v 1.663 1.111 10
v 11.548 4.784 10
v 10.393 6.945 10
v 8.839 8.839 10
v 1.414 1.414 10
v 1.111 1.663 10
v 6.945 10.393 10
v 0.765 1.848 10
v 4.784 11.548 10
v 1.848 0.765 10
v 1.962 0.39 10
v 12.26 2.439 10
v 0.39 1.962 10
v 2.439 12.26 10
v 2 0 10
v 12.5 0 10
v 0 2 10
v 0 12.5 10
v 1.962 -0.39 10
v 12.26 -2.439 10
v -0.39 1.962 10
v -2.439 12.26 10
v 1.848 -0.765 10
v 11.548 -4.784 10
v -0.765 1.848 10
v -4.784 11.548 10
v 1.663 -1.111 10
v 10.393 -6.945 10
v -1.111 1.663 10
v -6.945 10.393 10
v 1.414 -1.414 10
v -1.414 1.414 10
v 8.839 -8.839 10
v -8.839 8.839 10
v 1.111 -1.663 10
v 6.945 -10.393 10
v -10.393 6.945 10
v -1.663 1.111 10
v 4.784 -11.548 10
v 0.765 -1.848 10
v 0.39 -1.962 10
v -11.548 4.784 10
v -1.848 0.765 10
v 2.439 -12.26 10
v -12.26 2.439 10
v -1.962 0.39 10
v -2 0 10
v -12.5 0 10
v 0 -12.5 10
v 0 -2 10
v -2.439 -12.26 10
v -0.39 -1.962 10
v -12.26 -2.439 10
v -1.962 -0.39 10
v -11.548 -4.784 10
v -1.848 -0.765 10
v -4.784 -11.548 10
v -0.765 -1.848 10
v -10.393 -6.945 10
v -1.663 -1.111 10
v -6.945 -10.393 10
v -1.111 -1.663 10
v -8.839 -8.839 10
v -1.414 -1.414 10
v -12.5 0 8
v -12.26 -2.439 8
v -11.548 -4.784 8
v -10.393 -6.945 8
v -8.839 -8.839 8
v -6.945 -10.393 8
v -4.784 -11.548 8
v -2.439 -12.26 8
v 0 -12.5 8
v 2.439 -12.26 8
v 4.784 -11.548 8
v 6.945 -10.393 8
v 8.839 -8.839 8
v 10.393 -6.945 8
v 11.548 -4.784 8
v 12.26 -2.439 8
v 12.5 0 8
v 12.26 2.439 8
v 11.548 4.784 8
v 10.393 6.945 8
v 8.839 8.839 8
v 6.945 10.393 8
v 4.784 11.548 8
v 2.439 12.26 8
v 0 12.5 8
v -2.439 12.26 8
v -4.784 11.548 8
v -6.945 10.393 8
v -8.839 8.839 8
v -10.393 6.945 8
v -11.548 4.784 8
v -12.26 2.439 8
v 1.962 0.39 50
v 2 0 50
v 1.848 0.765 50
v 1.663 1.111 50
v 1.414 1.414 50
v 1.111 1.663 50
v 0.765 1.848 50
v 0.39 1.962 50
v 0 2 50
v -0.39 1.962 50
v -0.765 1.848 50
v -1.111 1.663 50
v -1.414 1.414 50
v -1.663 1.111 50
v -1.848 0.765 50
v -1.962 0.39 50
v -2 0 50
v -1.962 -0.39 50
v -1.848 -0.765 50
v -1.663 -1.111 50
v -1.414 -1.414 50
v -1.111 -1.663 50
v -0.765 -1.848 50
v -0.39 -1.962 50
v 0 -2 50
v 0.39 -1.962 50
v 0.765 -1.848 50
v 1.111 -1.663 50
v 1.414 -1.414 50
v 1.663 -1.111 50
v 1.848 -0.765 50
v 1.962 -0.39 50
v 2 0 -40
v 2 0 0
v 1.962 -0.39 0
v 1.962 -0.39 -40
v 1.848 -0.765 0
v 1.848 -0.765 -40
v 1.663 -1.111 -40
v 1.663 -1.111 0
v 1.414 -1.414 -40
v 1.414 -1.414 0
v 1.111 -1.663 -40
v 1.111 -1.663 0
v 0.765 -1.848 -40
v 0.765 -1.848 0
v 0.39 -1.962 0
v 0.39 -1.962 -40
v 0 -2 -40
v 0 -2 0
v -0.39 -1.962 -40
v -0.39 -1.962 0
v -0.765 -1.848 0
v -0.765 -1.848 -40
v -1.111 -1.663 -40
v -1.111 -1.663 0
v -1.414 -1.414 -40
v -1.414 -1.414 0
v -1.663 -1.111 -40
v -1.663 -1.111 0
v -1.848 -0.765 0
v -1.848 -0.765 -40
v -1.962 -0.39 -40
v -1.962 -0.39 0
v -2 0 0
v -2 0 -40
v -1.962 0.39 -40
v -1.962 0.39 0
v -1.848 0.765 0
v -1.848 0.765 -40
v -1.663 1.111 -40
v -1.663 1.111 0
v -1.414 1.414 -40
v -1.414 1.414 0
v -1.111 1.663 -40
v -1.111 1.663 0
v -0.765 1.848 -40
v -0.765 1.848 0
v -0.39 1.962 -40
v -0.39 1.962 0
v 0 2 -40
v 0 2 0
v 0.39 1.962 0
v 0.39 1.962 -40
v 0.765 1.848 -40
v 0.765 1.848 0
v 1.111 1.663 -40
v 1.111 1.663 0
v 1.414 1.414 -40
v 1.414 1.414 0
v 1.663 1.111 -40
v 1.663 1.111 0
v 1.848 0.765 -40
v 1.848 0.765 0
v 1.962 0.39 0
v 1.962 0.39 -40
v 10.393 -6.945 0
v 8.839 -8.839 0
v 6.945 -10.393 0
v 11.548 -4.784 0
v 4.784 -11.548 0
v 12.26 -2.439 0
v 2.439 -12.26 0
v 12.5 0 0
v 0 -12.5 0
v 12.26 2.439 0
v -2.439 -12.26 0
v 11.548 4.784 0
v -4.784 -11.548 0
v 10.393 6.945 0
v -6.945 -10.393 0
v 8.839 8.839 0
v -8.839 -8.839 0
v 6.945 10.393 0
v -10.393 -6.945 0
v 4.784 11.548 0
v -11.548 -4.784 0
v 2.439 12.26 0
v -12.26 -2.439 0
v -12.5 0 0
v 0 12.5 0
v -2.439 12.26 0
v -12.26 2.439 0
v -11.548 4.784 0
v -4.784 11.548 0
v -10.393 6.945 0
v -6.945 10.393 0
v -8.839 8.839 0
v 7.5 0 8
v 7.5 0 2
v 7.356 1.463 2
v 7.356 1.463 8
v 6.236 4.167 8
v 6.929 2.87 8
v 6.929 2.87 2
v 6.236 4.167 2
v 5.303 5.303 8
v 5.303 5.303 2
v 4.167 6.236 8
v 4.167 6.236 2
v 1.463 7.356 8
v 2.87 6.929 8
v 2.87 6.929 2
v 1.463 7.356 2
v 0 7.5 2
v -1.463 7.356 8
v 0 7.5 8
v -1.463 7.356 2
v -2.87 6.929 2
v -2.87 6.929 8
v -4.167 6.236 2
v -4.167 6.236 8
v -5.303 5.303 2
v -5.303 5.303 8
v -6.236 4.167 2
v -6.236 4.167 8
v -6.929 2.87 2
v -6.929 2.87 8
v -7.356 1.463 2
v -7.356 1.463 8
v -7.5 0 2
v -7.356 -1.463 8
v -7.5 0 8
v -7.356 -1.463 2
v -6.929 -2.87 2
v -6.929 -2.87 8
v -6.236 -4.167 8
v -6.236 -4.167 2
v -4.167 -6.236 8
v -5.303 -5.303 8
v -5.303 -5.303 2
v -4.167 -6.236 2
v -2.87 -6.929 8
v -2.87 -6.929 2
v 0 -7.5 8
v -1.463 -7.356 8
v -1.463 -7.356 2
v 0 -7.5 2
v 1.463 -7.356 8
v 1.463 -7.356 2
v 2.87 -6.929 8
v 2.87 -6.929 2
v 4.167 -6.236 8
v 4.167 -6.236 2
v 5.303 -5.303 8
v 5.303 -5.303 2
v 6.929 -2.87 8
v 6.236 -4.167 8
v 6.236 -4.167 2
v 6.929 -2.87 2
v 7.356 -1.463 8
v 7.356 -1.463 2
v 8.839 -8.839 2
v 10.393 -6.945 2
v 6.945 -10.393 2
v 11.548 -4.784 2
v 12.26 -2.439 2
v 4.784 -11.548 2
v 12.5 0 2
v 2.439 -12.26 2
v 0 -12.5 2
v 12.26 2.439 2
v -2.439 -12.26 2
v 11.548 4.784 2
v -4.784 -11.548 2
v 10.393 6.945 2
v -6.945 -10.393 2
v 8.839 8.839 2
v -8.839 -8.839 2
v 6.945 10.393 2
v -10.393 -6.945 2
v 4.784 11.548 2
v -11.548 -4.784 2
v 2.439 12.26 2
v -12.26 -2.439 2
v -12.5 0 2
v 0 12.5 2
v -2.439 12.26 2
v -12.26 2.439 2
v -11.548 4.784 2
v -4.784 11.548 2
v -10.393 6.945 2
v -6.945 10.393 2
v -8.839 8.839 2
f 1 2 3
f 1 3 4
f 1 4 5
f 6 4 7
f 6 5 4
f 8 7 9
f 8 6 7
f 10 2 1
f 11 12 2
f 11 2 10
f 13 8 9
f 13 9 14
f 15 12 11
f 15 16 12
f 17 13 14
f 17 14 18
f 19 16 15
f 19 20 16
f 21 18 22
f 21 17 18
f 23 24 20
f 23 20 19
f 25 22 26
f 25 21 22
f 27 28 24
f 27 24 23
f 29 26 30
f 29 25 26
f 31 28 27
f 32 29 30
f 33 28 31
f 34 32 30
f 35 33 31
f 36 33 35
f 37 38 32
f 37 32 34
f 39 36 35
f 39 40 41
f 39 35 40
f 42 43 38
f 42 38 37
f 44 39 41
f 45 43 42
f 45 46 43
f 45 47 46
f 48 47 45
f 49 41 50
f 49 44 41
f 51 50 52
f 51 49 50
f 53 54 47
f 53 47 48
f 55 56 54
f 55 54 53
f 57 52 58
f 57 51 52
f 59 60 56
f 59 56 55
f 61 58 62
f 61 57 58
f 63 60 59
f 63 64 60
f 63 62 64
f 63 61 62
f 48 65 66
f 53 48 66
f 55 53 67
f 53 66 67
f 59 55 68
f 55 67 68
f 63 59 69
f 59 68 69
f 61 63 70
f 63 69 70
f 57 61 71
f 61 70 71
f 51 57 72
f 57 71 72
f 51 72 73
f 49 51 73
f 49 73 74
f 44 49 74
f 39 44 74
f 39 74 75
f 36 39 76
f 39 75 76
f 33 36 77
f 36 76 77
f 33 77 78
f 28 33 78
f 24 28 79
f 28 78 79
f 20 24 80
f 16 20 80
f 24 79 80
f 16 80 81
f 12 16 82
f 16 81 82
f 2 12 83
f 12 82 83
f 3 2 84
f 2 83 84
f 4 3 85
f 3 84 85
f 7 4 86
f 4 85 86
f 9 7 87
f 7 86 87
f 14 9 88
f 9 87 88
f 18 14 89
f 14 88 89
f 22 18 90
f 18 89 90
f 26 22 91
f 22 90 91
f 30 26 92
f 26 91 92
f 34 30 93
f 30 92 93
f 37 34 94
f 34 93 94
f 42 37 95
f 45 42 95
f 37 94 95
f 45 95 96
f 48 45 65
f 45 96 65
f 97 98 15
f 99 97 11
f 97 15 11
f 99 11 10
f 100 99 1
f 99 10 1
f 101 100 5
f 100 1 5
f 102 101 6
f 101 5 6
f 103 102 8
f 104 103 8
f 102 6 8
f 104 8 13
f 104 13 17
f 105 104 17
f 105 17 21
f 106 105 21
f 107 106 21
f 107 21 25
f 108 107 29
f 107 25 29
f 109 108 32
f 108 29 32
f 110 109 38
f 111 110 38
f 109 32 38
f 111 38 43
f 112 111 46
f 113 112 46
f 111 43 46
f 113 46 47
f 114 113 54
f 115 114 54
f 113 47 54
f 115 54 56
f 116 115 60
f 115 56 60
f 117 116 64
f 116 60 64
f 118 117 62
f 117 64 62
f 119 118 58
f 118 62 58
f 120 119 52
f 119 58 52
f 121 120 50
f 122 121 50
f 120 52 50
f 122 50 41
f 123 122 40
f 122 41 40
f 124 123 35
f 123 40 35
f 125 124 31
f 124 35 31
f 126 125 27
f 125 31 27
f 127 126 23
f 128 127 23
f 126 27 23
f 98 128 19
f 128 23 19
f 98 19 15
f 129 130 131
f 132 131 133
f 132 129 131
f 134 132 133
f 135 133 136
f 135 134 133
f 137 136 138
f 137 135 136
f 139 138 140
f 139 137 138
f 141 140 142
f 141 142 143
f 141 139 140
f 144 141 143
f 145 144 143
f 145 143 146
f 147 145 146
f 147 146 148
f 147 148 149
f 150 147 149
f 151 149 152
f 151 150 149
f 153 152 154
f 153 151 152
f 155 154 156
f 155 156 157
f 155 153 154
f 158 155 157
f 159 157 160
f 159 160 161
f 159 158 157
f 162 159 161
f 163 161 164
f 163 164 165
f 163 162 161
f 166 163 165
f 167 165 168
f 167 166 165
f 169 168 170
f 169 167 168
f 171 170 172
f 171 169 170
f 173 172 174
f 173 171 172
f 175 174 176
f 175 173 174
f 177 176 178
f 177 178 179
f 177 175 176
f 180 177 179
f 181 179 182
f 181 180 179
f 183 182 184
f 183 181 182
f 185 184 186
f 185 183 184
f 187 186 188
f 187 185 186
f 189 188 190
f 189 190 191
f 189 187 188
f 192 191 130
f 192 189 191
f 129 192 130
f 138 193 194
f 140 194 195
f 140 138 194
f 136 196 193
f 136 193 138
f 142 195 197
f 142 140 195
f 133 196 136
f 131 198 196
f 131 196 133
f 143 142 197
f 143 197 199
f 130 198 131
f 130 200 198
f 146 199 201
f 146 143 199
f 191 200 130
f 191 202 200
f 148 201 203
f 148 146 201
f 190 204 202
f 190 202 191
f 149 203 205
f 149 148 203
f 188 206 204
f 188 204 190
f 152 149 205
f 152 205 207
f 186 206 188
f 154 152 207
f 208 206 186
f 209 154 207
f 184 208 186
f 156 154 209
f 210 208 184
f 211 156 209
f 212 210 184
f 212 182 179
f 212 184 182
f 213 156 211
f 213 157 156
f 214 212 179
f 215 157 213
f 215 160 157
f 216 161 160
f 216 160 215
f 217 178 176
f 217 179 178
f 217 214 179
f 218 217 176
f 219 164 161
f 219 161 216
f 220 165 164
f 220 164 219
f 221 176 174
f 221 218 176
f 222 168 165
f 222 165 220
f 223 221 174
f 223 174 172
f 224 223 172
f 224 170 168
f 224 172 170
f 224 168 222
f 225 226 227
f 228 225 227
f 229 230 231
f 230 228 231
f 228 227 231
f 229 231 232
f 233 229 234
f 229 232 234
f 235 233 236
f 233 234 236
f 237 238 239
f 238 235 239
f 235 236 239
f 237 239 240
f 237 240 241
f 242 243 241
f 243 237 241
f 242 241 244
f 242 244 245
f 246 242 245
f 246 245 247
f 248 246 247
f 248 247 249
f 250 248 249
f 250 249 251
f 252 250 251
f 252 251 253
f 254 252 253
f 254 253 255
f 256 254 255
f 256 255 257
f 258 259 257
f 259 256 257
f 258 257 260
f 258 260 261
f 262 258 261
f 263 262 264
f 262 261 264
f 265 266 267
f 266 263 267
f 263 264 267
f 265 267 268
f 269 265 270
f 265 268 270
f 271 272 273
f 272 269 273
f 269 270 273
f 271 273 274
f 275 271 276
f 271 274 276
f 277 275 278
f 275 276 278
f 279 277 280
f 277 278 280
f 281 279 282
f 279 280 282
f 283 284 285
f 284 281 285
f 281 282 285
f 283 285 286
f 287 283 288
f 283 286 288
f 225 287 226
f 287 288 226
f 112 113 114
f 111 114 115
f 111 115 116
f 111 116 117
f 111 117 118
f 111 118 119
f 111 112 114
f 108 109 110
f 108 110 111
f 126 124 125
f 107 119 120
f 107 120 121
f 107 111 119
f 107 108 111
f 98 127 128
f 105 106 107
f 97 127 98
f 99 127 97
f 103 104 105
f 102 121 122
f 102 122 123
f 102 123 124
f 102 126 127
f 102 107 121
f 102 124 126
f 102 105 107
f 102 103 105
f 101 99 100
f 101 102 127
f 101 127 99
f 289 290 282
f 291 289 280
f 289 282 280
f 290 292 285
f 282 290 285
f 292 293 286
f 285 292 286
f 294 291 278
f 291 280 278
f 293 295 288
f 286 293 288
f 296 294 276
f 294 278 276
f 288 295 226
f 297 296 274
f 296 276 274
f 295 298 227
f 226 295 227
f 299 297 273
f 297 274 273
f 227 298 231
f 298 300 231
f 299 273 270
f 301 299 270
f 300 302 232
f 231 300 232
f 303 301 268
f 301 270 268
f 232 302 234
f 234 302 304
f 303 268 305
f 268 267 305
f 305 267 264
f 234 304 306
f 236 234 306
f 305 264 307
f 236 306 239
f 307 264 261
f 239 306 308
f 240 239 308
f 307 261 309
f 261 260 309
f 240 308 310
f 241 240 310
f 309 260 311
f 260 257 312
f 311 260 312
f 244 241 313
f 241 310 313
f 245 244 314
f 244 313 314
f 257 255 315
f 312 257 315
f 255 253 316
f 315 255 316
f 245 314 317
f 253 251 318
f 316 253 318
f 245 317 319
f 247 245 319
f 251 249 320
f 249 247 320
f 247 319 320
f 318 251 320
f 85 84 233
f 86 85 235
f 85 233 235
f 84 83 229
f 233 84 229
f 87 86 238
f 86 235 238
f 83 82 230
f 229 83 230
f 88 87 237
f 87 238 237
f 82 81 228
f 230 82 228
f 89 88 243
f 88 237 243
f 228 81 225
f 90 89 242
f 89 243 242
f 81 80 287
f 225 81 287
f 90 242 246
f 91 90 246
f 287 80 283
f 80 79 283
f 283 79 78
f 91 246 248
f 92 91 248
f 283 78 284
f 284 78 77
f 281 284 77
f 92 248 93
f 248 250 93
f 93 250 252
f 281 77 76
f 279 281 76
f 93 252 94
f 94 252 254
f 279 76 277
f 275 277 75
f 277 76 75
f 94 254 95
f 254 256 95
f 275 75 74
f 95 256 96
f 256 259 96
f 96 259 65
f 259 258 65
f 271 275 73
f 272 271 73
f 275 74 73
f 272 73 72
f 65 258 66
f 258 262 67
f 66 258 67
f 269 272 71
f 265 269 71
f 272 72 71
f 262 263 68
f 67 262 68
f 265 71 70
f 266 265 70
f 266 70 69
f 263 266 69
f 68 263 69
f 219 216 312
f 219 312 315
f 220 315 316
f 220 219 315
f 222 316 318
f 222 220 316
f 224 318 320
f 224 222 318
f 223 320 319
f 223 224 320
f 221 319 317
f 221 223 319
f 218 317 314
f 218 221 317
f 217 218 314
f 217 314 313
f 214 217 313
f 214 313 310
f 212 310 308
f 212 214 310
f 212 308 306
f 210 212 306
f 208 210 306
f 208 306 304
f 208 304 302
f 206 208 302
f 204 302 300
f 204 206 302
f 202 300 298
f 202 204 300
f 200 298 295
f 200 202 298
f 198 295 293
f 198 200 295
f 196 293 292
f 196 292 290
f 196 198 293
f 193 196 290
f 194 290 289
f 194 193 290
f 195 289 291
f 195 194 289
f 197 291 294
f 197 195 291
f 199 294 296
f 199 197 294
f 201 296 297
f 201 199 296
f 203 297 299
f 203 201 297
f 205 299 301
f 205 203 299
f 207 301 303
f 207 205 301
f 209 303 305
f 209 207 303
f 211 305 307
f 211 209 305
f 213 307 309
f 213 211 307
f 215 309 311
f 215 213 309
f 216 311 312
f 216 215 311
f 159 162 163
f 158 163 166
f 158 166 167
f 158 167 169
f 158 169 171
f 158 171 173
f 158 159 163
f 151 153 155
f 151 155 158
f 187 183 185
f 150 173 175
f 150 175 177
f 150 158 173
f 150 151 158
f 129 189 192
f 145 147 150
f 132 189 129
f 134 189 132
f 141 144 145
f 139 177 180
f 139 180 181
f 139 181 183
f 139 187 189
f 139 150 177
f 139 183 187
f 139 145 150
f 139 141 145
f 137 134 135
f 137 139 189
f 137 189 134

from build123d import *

# Parameters (mm, degrees)
SKETCH1_R           = 7.5
BOSS_EXTRUDE1_DEPTH = 10
SKETCH2_R           = 12.5
BOSS_EXTRUDE2_DEPTH = 2
BOSS_EXTRUDE3_START = -2
SKETCH3_R           = 12.5
BOSS_EXTRUDE3_DEPTH = 2
SKETCH4_R           = 2
BOSS_EXTRUDE4_DEPTH = 40
BOSS_EXTRUDE5_START = 40
SKETCH5_R           = 2
BOSS_EXTRUDE5_DEPTH = 40


with BuildPart() as part:
    # Sketch1 → Boss-Extrude1 (new body)
    with BuildSketch(Plane.XY):
        Circle(SKETCH1_R)
    extrude(amount=BOSS_EXTRUDE1_DEPTH)

    # Sketch2 → Boss-Extrude2 (add)
    with BuildSketch(Plane(origin=(0, 0, 0), x_dir=(-1, 0, 0), z_dir=(0, 0, -1))):
        Circle(SKETCH2_R)
    extrude(amount=-BOSS_EXTRUDE2_DEPTH)

    # Sketch3 → Boss-Extrude3 (add)
    with BuildSketch(Plane.XY.offset(10).offset(BOSS_EXTRUDE3_START)):
        with Locations(Location((0, 0, 0), (0, 0, 180))):
            Circle(SKETCH3_R)
    extrude(amount=BOSS_EXTRUDE3_DEPTH)

    # Sketch4 → Boss-Extrude4 (add)
    with BuildSketch(Plane.XY.offset(10)):
        Circle(SKETCH4_R)
    extrude(amount=BOSS_EXTRUDE4_DEPTH)

    # Sketch5 → Boss-Extrude5 (add)
    with BuildSketch(Plane(origin=(0, 0, 0), x_dir=(-1, 0, 0), z_dir=(0, 0, -1)).offset(BOSS_EXTRUDE5_START)):
        with Locations(Location((0, 0, 0), (0, 0, 180))):
            Circle(SKETCH5_R)
    extrude(amount=-BOSS_EXTRUDE5_DEPTH)


solid = part.part
